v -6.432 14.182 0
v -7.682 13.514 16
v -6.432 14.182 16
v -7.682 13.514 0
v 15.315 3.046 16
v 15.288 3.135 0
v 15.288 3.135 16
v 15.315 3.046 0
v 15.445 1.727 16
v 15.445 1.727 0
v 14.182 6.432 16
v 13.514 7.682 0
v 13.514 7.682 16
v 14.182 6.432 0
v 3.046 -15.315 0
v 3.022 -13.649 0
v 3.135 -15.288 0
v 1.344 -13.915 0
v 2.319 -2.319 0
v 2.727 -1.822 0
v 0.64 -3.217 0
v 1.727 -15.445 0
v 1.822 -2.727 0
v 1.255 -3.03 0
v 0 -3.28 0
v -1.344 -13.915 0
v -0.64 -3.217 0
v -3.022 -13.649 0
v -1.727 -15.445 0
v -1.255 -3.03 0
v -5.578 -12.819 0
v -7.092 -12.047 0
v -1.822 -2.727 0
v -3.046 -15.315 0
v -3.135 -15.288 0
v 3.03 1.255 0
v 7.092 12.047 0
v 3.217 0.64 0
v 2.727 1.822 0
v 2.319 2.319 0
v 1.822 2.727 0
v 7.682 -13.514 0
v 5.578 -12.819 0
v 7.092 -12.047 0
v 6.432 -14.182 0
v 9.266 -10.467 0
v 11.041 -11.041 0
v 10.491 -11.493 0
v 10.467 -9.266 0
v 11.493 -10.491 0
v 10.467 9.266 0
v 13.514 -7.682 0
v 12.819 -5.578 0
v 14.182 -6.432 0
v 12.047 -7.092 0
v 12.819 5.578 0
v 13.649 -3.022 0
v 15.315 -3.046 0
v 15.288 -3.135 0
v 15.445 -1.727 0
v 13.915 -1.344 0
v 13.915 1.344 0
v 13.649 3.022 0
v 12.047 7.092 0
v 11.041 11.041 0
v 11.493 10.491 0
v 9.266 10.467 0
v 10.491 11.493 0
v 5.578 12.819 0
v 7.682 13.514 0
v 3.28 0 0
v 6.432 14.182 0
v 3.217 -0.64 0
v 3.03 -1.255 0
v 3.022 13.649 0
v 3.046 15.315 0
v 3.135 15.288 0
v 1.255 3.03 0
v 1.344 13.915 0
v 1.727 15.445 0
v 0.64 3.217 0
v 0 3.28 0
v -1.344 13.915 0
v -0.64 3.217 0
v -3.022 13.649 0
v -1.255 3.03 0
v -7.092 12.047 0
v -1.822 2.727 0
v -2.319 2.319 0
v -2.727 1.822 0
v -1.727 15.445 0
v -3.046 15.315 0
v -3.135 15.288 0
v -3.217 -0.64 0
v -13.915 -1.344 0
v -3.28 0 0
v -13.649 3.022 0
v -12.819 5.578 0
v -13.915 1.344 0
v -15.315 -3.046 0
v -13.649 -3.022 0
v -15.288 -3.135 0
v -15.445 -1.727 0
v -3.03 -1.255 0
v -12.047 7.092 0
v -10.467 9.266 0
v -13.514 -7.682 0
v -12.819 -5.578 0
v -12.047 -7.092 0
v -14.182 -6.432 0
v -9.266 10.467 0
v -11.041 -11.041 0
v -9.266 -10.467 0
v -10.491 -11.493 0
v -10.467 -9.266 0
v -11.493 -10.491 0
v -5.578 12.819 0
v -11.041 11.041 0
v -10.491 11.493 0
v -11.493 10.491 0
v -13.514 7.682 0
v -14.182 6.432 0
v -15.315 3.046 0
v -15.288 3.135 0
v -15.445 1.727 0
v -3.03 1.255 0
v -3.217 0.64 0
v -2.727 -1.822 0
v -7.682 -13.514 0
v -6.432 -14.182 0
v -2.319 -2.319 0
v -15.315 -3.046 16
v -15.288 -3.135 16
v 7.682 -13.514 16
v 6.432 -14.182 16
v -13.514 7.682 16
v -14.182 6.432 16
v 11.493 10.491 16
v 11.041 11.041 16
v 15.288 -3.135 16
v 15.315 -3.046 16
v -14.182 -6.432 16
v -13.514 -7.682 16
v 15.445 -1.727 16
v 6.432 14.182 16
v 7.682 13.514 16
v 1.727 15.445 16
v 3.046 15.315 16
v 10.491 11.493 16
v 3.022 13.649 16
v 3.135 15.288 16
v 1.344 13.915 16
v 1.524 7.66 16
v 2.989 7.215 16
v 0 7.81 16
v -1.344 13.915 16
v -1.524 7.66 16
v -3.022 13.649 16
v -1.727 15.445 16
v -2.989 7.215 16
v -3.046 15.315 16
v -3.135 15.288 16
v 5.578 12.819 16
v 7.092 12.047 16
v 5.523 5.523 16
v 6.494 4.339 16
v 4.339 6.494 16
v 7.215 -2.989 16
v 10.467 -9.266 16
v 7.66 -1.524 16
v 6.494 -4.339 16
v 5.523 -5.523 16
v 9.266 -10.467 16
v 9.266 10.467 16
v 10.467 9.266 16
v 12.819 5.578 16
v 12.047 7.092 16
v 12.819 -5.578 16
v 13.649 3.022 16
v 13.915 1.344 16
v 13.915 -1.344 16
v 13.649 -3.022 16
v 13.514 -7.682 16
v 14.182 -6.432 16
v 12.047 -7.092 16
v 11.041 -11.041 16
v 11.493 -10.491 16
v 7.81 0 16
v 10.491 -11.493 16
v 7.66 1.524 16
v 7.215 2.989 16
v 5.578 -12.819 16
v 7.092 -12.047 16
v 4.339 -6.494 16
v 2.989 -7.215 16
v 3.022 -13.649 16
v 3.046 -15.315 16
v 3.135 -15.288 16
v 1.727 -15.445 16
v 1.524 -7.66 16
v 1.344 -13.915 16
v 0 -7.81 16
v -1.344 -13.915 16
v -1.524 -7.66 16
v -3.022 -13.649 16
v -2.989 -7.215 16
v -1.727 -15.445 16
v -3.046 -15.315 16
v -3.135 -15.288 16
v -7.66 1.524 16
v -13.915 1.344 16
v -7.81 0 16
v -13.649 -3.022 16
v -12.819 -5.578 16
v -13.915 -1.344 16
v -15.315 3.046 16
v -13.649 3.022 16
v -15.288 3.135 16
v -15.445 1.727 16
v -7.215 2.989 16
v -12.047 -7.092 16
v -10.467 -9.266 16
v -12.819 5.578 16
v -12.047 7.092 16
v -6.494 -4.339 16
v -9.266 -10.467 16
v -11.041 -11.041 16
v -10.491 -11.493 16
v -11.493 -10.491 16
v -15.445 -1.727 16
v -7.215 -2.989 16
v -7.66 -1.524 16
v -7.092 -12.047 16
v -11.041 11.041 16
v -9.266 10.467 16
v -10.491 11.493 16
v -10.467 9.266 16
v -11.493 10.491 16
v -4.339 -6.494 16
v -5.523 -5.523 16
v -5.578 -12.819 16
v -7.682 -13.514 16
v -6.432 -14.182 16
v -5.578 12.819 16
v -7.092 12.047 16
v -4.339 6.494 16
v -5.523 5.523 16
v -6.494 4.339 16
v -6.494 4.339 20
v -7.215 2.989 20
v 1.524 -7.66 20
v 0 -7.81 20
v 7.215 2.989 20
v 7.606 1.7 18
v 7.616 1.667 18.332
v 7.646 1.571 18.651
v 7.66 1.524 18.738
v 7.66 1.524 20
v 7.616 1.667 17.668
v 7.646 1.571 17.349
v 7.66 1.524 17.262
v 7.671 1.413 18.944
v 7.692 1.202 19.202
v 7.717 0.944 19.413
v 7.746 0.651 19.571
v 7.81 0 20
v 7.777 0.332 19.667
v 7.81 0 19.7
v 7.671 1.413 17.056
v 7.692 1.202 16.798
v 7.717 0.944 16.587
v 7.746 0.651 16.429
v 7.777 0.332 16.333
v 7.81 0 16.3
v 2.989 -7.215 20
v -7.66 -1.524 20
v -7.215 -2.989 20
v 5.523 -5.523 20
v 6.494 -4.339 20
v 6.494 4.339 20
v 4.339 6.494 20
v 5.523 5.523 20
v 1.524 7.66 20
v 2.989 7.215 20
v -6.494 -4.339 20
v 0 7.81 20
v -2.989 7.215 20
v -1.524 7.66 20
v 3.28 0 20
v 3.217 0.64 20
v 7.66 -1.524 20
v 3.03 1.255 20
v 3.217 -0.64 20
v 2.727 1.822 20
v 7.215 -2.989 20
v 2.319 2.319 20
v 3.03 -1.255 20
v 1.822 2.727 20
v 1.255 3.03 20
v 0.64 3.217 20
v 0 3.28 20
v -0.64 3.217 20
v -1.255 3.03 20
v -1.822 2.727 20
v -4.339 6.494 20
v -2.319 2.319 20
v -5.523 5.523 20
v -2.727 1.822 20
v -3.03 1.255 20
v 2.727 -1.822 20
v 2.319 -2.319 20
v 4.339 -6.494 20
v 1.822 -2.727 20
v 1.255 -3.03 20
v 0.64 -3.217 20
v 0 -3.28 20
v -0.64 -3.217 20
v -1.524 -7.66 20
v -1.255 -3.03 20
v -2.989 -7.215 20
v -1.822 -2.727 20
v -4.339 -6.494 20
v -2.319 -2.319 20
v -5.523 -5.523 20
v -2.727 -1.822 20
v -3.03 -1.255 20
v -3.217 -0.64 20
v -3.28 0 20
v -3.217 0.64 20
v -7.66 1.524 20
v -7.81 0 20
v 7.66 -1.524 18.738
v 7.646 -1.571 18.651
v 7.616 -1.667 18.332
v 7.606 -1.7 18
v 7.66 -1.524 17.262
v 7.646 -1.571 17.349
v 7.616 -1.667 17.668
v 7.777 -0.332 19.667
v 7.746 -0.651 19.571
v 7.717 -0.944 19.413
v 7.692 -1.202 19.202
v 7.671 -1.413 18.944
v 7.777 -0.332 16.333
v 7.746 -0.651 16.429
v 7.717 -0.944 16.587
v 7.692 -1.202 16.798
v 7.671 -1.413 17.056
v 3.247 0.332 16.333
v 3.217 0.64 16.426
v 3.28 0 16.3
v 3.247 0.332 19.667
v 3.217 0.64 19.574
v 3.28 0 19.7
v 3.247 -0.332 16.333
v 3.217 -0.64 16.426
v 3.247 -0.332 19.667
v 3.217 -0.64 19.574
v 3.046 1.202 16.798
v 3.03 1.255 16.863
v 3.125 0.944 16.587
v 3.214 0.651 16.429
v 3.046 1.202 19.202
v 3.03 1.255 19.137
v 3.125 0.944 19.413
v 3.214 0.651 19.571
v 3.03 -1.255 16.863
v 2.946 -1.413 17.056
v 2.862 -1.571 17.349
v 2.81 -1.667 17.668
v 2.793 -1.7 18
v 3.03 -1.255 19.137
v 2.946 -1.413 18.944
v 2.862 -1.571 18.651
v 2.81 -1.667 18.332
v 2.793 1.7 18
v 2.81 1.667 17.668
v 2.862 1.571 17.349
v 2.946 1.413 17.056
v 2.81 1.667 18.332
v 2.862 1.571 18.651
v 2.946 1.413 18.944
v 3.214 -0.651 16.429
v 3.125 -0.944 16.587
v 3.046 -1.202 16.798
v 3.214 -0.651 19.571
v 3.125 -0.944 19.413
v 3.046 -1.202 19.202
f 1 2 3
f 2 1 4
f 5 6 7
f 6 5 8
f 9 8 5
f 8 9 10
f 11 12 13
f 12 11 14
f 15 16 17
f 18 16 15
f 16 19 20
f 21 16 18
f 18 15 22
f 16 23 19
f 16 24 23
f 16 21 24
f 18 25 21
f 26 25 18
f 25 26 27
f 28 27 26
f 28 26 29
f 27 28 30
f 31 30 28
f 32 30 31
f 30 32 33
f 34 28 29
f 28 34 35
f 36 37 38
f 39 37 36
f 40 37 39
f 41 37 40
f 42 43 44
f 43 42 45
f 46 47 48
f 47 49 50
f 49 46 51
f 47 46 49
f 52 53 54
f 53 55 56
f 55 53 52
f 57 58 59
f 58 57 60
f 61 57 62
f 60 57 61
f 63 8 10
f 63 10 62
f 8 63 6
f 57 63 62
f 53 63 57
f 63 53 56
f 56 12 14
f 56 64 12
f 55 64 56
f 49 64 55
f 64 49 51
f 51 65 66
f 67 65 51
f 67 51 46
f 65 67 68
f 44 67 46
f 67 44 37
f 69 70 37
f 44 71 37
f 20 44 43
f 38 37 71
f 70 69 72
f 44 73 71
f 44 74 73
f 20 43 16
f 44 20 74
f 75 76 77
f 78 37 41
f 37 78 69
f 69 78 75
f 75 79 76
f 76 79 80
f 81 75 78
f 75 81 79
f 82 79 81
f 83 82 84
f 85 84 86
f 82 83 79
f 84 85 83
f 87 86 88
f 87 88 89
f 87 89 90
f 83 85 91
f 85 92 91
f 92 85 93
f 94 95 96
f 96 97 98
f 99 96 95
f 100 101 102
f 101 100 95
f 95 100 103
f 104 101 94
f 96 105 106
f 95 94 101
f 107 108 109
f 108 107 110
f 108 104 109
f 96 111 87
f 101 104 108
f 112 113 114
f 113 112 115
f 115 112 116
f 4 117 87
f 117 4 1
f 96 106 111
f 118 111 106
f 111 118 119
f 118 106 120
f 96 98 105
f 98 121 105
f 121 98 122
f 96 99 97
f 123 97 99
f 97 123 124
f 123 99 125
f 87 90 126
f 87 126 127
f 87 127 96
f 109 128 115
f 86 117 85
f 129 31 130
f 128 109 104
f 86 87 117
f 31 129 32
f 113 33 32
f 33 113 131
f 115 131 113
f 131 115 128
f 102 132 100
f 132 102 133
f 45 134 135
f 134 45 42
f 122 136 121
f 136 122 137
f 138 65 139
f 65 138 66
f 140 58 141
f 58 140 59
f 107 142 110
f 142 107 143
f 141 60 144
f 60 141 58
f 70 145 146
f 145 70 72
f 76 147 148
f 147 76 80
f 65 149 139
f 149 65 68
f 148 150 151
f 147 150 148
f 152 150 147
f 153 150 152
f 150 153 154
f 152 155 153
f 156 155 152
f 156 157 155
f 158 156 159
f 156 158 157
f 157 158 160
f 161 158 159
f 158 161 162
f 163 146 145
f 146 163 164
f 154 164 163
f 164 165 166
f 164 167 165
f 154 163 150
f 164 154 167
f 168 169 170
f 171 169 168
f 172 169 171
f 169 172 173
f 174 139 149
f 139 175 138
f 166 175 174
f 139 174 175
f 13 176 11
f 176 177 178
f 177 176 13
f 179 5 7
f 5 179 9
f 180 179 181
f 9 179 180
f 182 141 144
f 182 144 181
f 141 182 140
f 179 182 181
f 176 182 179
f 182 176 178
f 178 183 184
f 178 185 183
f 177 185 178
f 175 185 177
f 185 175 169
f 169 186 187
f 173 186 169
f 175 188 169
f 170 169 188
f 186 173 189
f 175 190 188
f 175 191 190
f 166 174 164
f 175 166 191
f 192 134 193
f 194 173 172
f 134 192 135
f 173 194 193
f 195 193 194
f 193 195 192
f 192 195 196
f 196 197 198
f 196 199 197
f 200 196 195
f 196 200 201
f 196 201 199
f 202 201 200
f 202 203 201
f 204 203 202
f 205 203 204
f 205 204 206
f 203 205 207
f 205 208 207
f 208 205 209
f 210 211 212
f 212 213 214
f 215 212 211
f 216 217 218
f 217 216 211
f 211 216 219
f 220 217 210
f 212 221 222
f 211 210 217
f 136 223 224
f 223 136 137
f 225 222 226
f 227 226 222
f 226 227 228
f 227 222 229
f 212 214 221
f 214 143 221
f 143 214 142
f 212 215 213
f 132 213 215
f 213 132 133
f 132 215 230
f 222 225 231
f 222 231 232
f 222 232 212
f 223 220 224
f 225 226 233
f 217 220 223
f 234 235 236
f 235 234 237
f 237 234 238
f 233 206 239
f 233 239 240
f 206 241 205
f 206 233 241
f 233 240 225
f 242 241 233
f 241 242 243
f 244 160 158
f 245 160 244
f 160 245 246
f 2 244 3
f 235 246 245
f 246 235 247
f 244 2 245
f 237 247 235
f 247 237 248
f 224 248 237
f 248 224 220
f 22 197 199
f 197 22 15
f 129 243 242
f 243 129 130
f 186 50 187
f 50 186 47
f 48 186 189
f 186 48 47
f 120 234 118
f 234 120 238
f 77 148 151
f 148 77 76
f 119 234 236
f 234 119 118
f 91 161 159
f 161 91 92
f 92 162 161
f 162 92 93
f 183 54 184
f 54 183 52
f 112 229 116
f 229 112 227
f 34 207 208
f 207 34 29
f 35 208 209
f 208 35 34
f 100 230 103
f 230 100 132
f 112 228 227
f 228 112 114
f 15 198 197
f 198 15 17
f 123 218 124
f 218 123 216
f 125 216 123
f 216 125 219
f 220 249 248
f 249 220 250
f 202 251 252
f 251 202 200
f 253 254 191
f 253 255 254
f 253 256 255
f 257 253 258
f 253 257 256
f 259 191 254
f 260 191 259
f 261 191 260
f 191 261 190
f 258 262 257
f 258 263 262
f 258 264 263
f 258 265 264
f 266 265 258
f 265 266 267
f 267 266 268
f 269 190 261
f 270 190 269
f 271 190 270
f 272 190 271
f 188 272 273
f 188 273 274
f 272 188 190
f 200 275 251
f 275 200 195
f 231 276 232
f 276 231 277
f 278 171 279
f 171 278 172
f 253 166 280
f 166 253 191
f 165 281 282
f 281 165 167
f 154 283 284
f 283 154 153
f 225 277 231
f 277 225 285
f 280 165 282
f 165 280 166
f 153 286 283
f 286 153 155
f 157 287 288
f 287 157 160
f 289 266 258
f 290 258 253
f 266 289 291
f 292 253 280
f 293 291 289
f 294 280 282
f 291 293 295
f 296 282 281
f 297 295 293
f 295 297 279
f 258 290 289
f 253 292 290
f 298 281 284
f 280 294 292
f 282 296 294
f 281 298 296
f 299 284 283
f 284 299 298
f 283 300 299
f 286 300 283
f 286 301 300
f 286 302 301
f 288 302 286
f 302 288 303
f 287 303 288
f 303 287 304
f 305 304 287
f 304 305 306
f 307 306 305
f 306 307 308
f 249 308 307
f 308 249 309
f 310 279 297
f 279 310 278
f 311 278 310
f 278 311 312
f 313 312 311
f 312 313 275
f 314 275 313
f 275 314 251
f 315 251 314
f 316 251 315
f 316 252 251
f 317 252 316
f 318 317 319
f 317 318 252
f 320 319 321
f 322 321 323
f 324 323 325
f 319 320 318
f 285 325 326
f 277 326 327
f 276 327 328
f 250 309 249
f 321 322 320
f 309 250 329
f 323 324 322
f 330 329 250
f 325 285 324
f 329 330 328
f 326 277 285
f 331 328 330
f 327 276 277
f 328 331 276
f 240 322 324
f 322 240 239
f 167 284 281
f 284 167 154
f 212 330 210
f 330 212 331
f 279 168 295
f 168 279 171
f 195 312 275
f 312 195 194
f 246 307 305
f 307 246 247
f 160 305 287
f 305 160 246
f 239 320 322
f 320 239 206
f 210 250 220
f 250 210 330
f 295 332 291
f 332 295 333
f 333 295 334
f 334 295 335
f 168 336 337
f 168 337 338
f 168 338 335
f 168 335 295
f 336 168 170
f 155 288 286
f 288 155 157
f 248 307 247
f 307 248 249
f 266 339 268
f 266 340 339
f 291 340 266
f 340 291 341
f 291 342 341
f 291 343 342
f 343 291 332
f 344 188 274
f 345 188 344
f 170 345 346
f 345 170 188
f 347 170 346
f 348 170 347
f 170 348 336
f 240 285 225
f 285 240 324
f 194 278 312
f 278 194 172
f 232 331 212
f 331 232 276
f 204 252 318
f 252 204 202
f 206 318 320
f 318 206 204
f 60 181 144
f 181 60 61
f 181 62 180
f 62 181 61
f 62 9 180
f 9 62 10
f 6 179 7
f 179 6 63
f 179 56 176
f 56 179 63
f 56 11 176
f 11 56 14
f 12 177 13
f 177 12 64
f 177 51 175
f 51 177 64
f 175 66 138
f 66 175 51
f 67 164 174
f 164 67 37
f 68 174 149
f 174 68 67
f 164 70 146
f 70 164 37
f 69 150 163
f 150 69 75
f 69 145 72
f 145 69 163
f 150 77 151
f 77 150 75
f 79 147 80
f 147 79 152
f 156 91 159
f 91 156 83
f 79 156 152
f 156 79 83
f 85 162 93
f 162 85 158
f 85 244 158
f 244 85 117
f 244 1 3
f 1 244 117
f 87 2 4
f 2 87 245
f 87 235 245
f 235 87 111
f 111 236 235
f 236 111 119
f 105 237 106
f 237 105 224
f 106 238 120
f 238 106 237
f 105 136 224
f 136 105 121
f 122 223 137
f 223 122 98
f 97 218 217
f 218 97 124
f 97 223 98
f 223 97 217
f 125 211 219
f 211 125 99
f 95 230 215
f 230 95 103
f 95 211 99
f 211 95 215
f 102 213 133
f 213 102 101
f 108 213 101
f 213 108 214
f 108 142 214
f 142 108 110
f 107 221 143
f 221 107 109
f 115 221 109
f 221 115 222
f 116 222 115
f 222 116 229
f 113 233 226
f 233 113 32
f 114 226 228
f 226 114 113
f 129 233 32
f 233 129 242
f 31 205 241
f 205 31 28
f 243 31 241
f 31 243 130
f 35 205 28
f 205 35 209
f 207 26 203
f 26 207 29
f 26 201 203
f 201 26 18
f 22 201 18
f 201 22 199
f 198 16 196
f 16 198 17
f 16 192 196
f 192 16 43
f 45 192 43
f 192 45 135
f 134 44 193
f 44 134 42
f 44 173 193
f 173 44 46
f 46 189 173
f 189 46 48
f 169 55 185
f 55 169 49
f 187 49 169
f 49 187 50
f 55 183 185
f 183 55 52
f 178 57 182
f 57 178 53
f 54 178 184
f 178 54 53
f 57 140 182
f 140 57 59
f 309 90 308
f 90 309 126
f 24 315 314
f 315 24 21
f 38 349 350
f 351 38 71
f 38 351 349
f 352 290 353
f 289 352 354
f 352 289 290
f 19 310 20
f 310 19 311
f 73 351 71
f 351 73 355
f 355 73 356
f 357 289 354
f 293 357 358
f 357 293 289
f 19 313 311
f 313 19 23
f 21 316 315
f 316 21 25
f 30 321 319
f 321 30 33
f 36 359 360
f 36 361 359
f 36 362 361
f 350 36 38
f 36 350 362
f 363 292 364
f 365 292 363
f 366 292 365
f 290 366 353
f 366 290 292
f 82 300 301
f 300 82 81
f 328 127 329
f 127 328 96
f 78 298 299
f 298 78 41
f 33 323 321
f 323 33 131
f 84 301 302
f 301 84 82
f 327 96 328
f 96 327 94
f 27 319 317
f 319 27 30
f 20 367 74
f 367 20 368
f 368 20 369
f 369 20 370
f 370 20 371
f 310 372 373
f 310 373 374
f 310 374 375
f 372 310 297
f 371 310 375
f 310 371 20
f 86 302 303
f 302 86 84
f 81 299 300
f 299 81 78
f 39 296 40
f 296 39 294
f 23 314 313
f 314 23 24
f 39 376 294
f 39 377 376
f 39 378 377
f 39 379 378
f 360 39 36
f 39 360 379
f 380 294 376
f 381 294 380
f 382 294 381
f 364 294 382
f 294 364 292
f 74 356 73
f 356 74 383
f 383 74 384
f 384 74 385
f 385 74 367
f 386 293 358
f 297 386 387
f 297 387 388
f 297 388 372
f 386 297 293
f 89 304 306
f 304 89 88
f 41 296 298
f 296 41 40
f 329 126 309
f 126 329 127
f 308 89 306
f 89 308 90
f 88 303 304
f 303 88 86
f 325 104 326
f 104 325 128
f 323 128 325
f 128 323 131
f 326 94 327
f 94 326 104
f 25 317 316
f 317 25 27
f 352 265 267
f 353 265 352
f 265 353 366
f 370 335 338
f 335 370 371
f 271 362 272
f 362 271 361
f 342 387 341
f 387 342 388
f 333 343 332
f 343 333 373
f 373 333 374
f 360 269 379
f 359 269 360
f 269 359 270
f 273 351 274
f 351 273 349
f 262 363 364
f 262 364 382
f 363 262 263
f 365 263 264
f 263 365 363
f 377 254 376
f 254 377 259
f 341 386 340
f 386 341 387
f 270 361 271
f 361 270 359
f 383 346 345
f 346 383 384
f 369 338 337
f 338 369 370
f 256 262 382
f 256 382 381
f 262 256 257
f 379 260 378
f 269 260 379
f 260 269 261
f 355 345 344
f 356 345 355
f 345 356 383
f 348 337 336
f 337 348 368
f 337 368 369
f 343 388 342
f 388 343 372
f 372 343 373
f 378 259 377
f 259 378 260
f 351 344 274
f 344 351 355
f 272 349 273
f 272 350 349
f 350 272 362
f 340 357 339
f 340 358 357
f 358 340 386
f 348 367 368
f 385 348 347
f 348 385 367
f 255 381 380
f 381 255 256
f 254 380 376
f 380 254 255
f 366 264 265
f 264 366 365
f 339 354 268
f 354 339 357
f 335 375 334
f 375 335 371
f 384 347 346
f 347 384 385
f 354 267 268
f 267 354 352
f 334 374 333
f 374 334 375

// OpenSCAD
$fn = 32;

// ----------------------------------------------------------------------
// Timing pulley: HTD5 20T, pitch 5 mm, 31.23 mm x 20 mm
// ----------------------------------------------------------------------

// --- parameters (mm) ---
pitch_mm = 5;             // belt pitch
tooth_count = 20;         // number of grooves
width = 16;               // belt width between the flanges
tip_d = 31.23;            // tip circle diameter
root_d = 29.03;           // groove bottom diameter
groove_h = 1.1;           // groove depth
tooth_w = 3.2;            // groove width at the tip circle
hub_bore = 6.56;          // shaft bore
hub_d = 15.62;            // hub diameter
hub_h = 4;                // hub above the flange
bottom_z = 0;             // lowest point of the pulley
top_z = 20;               // highest point of the pulley
set_d = 3.4;              // set screw tap hole

module rim() {
  cylinder(h = width, d = tip_d);
}

module groove_cutter() {
  /* belt tooth groove: deeper than wide, cut through the belt width */
  translate([root_d / 2, 0, 0])
    linear_extrude(height = width)
      polygon(points = [[-0.6, -tooth_w * 0.42], [groove_h + 0.6, -tooth_w * 0.6],
                        [groove_h + 0.6, tooth_w * 0.6], [-0.6, tooth_w * 0.42]]);
}

module hub() {
  translate([0, 0, bottom_z]) cylinder(h = top_z - bottom_z, d = hub_d);
}

difference() {
  union() {
    rim();
    hub();
  }
  for (i = [0 : tooth_count - 1]) rotate([0, 0, i * 360 / tooth_count]) groove_cutter();
  translate([0, 0, bottom_z - 1]) cylinder(h = top_z - bottom_z + 2, d = hub_bore);
  translate([-1, 0, top_z - hub_h * 0.5]) rotate([0, 90, 0]) cylinder(h = hub_d / 2 + 3, d = set_d);
}
